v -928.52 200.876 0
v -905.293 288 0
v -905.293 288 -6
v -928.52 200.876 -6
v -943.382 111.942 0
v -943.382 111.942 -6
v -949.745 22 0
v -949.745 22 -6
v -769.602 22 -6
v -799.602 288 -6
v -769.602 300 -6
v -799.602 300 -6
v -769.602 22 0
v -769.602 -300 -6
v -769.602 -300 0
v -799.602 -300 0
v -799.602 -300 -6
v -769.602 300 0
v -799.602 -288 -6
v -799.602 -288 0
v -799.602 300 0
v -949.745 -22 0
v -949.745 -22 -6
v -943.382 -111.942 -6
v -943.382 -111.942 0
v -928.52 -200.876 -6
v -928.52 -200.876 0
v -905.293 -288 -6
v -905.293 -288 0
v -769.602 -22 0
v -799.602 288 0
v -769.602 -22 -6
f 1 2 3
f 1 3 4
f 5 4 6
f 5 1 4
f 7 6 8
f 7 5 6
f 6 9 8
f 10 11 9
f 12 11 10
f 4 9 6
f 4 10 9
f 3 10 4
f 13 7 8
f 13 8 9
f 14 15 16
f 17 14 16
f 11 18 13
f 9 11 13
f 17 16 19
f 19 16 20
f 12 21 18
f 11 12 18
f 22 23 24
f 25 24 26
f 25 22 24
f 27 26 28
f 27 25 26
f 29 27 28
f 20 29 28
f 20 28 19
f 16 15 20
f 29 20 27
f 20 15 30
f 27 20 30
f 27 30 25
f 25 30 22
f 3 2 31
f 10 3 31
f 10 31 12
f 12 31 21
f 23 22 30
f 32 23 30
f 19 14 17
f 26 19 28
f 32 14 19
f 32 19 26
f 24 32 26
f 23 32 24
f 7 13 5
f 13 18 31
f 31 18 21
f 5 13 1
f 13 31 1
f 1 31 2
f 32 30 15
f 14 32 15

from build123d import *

# Parameters (mm, degrees)
SKETCH1_R           = 950
SKETCH1_R_2         = 840
BASE_FLANGE1_DEPTH  = 6
SKETCH6_W           = 3903.37574265
SKETCH6_H           = 2501.66331226
SKETCH6_W_2         = 2732.981099596
SKETCH6_H_2         = 600
CUT_EXTRUDE1_DEPTH  = 10
BOSS_EXTRUDE1_DEPTH = 6
SKETCH8_W           = 418.285884571
SKETCH8_H           = 44
CUT_EXTRUDE2_DEPTH  = 10
SKETCH13_W          = 115.405661545
SKETCH13_H          = 12
CUT_EXTRUDE3_DEPTH  = 10
SKETCH14_W          = 124.238303048
SKETCH14_H          = 12
CUT_EXTRUDE4_DEPTH  = 10


# Sheet-metal steps are written as plain solids
with BuildPart() as part:
    # Sketch1 → Base-Flange1 (new body)
    with BuildSketch(Plane.XY):
        Circle(SKETCH1_R)
        Circle(SKETCH1_R_2, mode=Mode.SUBTRACT)
    extrude(amount=-BASE_FLANGE1_DEPTH)

    # Sketch6 → Cut-Extrude1 (cut)
    with BuildSketch(Plane.XY):
        Rectangle(SKETCH6_W, SKETCH6_H)
        with Locations((-160.657409421, 0)):
            Rectangle(SKETCH6_W_2, SKETCH6_H_2, mode=Mode.SUBTRACT)
    extrude(amount=-CUT_EXTRUDE1_DEPTH, mode=Mode.SUBTRACT)


with BuildPart() as cut_extrude1_kept_piece:
    # of the separate pieces the step leaves, the one the design keeps (cut_extrude1_pieces_kept)
    add(part.part.solids().sort_by_distance((-901.387818866, 300, 0))[0])

    # Sketch7 → Boss-Extrude1 (add)
    with BuildSketch(Plane.XY):
        with BuildLine():
            Line((-784.601809837, 300), (-769.601809837, 300))
            Line((-769.601809837, 300), (-769.601809837, -300))
            Line((-769.601809837, -300), (-784.601809837, -300))
            ThreePointArc((-784.601809837, -300), (-840, 0), (-784.601809837, 300))
        make_face()
    extrude(amount=-BOSS_EXTRUDE1_DEPTH)

    # Sketch8 → Cut-Extrude2 (cut)
    with BuildSketch(Plane.XY):
        with Locations((-769.601809838, 0)):
            Rectangle(SKETCH8_W, SKETCH8_H)
    extrude(amount=-CUT_EXTRUDE2_DEPTH, mode=Mode.SUBTRACT)


with BuildPart() as cut_extrude2_piece_1:
    # of the separate pieces the step leaves, piece 1, a body of its own (cut_extrude2_pieces)
    add(cut_extrude1_kept_piece.part.solids().sort_by_distance((-949.745228996, -22, 0))[0])

    # Sketch14 → Cut-Extrude4 (cut)
    with BuildSketch(Plane.XY):
        with Locations((-861.720961361, -294)):
            Rectangle(SKETCH14_W, SKETCH14_H)
    extrude(amount=-CUT_EXTRUDE4_DEPTH, mode=Mode.SUBTRACT)


with BuildPart() as cut_extrude2_piece_2:
    # of the separate pieces the step leaves, piece 2, a body of its own (cut_extrude2_pieces)
    add(cut_extrude1_kept_piece.part.solids().sort_by_distance((-901.387818866, 300, 0))[0])

    # Sketch13 → Cut-Extrude3 (cut)
    with BuildSketch(Plane.XY):
        with Locations((-857.304640609, 294)):
            Rectangle(SKETCH13_W, SKETCH13_H)
    extrude(amount=-CUT_EXTRUDE3_DEPTH, mode=Mode.SUBTRACT)


solid = Compound([cut_extrude2_piece_1.part, cut_extrude2_piece_2.part])
